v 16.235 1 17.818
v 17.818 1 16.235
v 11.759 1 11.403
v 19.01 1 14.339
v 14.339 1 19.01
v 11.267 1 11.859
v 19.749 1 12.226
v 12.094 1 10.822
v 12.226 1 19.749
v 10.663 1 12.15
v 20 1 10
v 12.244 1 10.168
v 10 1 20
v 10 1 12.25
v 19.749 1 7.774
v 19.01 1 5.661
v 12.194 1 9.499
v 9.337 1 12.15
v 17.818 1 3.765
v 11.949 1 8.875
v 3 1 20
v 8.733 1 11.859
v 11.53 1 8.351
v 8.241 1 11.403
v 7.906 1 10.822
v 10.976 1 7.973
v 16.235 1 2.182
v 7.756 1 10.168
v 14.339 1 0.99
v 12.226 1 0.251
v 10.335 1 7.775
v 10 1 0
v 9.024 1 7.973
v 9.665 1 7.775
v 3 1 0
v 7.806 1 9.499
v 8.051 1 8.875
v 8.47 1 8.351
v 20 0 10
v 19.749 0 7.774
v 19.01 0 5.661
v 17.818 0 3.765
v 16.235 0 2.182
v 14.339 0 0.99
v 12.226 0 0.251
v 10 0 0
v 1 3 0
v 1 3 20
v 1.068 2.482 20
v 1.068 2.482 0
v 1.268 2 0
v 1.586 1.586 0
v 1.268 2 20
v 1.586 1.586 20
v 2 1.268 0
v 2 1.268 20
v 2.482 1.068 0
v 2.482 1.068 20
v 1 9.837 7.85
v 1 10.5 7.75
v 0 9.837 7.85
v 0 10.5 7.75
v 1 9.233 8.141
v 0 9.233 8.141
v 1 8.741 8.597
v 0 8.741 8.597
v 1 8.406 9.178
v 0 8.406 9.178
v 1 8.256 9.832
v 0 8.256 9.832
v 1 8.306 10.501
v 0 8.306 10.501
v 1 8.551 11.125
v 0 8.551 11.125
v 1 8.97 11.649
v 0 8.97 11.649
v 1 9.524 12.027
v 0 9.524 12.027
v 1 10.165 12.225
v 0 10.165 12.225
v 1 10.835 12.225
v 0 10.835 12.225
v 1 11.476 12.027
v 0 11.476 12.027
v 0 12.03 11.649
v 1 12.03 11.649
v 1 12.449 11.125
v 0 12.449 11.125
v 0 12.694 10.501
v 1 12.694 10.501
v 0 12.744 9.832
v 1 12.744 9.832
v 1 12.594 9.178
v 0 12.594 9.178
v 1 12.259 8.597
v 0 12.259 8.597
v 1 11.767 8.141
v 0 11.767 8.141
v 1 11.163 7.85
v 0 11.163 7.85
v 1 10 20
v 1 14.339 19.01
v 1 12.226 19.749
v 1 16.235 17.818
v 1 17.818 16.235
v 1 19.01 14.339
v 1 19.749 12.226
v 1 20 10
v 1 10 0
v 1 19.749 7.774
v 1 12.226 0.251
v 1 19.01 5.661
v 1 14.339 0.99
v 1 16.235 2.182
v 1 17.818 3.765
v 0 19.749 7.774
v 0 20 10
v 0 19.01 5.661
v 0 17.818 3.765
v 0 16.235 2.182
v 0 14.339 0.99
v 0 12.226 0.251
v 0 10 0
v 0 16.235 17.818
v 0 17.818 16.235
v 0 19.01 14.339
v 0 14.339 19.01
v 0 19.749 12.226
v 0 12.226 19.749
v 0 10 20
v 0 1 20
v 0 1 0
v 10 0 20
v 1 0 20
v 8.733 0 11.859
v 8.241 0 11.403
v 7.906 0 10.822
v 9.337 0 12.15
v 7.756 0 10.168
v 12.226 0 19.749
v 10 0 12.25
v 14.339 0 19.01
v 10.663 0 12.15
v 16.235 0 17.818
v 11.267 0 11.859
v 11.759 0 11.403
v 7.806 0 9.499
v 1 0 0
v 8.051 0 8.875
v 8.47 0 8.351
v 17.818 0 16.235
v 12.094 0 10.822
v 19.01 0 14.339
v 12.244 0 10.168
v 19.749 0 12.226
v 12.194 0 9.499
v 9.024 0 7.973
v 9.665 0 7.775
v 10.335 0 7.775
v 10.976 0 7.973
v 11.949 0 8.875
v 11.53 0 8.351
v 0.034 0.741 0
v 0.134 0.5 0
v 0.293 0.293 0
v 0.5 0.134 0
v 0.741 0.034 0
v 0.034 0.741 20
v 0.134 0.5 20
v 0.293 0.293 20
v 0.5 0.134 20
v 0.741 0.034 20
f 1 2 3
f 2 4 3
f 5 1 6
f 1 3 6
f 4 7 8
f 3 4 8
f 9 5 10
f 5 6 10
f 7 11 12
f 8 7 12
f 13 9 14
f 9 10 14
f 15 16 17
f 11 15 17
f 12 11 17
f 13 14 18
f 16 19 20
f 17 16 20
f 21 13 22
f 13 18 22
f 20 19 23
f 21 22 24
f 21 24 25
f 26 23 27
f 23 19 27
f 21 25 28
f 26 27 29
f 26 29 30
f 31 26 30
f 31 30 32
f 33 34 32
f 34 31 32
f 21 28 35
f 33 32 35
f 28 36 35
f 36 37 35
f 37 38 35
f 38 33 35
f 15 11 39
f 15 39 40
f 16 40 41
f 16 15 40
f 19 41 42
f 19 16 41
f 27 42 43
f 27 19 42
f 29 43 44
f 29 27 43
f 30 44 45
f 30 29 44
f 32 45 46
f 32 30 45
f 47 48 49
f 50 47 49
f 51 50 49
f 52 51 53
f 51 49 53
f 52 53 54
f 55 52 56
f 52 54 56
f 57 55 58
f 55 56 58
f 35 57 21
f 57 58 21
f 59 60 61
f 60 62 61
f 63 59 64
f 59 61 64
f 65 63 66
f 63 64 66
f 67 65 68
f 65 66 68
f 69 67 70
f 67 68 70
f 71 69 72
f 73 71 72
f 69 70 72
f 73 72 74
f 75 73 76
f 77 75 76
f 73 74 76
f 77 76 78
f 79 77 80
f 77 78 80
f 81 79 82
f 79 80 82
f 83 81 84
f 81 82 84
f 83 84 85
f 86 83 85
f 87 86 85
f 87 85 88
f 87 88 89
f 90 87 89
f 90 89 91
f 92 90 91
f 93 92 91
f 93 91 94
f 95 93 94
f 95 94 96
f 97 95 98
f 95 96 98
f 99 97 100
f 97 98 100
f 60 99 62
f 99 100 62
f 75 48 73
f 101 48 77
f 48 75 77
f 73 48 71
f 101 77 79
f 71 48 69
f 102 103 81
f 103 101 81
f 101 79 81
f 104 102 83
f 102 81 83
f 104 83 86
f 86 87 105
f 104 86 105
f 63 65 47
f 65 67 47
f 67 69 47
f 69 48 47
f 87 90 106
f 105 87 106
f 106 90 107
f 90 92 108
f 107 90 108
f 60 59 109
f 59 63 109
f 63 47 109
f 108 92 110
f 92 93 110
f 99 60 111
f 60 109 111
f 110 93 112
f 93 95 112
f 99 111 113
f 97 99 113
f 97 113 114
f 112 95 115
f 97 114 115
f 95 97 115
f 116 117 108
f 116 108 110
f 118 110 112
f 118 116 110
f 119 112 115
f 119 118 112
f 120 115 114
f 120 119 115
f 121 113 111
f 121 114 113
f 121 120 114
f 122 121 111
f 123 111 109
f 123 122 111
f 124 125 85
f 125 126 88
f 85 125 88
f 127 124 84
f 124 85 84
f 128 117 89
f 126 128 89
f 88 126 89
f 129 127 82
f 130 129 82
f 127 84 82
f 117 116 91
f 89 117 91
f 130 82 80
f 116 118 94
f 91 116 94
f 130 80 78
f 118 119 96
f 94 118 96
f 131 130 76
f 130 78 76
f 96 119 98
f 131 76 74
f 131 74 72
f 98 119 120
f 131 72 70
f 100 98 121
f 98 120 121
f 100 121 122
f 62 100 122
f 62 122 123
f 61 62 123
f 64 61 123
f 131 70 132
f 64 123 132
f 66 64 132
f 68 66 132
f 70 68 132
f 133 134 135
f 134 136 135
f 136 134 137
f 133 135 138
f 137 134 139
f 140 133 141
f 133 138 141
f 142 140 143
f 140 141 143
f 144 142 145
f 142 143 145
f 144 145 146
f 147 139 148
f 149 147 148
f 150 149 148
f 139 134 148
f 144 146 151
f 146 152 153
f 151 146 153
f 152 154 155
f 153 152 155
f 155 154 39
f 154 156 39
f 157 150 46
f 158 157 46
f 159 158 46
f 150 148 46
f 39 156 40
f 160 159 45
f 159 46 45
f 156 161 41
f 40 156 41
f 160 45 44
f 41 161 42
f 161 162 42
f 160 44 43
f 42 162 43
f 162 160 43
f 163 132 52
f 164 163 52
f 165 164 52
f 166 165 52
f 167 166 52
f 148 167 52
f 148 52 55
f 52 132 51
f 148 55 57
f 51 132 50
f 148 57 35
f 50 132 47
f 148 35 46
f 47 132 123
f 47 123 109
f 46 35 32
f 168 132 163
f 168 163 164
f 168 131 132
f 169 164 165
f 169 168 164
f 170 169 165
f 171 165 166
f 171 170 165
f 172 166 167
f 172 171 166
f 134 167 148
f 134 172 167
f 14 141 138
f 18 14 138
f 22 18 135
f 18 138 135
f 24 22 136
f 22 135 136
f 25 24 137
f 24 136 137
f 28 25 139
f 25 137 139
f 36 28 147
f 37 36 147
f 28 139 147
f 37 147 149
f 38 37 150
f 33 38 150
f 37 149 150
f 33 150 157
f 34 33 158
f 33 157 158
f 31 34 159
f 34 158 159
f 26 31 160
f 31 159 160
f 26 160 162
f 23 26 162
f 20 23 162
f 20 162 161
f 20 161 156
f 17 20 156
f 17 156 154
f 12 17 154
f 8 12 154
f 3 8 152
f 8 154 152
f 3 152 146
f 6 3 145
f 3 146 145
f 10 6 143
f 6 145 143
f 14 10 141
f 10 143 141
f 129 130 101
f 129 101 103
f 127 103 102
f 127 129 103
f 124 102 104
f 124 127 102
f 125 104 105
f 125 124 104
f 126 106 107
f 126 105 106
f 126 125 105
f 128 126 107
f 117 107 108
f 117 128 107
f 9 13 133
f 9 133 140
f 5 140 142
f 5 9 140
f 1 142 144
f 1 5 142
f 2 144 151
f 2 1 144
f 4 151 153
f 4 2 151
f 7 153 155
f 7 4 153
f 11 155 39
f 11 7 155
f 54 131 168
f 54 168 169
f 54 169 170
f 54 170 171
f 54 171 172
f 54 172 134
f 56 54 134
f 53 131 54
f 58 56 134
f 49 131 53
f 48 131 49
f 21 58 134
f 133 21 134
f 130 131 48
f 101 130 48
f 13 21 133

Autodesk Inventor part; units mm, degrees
ref_plane "YZ Plane" through (0, 0, 0) normal (1, 0, 0) x (0, 1, 0)
ref_plane "XZ Plane" through (0, 0, 0) normal (0, 1, 0) x (-1, 0, 0)
ref_plane "XY Plane" through (0, 0, 0) normal (0, 0, 1) x (1, 0, 0)
sketch "Sketch1" plane through (0, 0, 0) normal (0, 0, 1) x (1, 0, 0)
  line L0 (0, 20) -> (0, 0)
  line L1 (0, 0) -> (20, 0)
  line L2 (20, 0) -> (20, 1)
  line L3 (20, 1) -> (1, 1)
  line L4 (1, 1) -> (1, 20)
  line L5 (1, 20) -> (0, 20)
  dimension "d0" = 20
  dimension "d1" = 20
  dimension "d2" = 1
  dimension "d3" = 1
extrude "Extrusion1" add sketch "Sketch1" along normal blind 20
sketch "Sketch2" plane through (1, 1, 0) normal (1, 0, 0) x (0, 0, -1)
  line L0 (0, 19) -> (-20, 19) projected
  line L1 (0, 0) -> (0, 19) projected
  point P0 (0, -1)
  point P1 (-10, 9.5)
  point P2 (-10, 19)
  point P3 (0, 9.5)
hole "Hole1" at (1, 10.5, 10) direction (-1, 0, 0) diameter 4.5 end through all
sketch "Sketch3" plane through (1, 1, 0) normal (0, 1, 0) x (1, 0, 0)
  line L0 (-1, 0) -> (19, 0) projected
  line L1 (19, 0) -> (19, -20) projected
  point P0 (9, -10)
  point P1 (9, 0)
  point P2 (19, -10)
hole "Hole2" at (10, 1, 10) direction (0, -1, 0) diameter 4.5 end through all
fillet "Fillet1" radius 2 1 edges at (1, 1, 10)
fillet "Fillet2" radius 10 4 edges at (0.5, 20, 20) (0.5, 20, 0) (20, 0.5, 0) (20, 0.5, 20)
fillet "Fillet3" radius 1 1 edges at (0, 0, 10)
properties part number "Vertical Support - 90deg Bracket"
